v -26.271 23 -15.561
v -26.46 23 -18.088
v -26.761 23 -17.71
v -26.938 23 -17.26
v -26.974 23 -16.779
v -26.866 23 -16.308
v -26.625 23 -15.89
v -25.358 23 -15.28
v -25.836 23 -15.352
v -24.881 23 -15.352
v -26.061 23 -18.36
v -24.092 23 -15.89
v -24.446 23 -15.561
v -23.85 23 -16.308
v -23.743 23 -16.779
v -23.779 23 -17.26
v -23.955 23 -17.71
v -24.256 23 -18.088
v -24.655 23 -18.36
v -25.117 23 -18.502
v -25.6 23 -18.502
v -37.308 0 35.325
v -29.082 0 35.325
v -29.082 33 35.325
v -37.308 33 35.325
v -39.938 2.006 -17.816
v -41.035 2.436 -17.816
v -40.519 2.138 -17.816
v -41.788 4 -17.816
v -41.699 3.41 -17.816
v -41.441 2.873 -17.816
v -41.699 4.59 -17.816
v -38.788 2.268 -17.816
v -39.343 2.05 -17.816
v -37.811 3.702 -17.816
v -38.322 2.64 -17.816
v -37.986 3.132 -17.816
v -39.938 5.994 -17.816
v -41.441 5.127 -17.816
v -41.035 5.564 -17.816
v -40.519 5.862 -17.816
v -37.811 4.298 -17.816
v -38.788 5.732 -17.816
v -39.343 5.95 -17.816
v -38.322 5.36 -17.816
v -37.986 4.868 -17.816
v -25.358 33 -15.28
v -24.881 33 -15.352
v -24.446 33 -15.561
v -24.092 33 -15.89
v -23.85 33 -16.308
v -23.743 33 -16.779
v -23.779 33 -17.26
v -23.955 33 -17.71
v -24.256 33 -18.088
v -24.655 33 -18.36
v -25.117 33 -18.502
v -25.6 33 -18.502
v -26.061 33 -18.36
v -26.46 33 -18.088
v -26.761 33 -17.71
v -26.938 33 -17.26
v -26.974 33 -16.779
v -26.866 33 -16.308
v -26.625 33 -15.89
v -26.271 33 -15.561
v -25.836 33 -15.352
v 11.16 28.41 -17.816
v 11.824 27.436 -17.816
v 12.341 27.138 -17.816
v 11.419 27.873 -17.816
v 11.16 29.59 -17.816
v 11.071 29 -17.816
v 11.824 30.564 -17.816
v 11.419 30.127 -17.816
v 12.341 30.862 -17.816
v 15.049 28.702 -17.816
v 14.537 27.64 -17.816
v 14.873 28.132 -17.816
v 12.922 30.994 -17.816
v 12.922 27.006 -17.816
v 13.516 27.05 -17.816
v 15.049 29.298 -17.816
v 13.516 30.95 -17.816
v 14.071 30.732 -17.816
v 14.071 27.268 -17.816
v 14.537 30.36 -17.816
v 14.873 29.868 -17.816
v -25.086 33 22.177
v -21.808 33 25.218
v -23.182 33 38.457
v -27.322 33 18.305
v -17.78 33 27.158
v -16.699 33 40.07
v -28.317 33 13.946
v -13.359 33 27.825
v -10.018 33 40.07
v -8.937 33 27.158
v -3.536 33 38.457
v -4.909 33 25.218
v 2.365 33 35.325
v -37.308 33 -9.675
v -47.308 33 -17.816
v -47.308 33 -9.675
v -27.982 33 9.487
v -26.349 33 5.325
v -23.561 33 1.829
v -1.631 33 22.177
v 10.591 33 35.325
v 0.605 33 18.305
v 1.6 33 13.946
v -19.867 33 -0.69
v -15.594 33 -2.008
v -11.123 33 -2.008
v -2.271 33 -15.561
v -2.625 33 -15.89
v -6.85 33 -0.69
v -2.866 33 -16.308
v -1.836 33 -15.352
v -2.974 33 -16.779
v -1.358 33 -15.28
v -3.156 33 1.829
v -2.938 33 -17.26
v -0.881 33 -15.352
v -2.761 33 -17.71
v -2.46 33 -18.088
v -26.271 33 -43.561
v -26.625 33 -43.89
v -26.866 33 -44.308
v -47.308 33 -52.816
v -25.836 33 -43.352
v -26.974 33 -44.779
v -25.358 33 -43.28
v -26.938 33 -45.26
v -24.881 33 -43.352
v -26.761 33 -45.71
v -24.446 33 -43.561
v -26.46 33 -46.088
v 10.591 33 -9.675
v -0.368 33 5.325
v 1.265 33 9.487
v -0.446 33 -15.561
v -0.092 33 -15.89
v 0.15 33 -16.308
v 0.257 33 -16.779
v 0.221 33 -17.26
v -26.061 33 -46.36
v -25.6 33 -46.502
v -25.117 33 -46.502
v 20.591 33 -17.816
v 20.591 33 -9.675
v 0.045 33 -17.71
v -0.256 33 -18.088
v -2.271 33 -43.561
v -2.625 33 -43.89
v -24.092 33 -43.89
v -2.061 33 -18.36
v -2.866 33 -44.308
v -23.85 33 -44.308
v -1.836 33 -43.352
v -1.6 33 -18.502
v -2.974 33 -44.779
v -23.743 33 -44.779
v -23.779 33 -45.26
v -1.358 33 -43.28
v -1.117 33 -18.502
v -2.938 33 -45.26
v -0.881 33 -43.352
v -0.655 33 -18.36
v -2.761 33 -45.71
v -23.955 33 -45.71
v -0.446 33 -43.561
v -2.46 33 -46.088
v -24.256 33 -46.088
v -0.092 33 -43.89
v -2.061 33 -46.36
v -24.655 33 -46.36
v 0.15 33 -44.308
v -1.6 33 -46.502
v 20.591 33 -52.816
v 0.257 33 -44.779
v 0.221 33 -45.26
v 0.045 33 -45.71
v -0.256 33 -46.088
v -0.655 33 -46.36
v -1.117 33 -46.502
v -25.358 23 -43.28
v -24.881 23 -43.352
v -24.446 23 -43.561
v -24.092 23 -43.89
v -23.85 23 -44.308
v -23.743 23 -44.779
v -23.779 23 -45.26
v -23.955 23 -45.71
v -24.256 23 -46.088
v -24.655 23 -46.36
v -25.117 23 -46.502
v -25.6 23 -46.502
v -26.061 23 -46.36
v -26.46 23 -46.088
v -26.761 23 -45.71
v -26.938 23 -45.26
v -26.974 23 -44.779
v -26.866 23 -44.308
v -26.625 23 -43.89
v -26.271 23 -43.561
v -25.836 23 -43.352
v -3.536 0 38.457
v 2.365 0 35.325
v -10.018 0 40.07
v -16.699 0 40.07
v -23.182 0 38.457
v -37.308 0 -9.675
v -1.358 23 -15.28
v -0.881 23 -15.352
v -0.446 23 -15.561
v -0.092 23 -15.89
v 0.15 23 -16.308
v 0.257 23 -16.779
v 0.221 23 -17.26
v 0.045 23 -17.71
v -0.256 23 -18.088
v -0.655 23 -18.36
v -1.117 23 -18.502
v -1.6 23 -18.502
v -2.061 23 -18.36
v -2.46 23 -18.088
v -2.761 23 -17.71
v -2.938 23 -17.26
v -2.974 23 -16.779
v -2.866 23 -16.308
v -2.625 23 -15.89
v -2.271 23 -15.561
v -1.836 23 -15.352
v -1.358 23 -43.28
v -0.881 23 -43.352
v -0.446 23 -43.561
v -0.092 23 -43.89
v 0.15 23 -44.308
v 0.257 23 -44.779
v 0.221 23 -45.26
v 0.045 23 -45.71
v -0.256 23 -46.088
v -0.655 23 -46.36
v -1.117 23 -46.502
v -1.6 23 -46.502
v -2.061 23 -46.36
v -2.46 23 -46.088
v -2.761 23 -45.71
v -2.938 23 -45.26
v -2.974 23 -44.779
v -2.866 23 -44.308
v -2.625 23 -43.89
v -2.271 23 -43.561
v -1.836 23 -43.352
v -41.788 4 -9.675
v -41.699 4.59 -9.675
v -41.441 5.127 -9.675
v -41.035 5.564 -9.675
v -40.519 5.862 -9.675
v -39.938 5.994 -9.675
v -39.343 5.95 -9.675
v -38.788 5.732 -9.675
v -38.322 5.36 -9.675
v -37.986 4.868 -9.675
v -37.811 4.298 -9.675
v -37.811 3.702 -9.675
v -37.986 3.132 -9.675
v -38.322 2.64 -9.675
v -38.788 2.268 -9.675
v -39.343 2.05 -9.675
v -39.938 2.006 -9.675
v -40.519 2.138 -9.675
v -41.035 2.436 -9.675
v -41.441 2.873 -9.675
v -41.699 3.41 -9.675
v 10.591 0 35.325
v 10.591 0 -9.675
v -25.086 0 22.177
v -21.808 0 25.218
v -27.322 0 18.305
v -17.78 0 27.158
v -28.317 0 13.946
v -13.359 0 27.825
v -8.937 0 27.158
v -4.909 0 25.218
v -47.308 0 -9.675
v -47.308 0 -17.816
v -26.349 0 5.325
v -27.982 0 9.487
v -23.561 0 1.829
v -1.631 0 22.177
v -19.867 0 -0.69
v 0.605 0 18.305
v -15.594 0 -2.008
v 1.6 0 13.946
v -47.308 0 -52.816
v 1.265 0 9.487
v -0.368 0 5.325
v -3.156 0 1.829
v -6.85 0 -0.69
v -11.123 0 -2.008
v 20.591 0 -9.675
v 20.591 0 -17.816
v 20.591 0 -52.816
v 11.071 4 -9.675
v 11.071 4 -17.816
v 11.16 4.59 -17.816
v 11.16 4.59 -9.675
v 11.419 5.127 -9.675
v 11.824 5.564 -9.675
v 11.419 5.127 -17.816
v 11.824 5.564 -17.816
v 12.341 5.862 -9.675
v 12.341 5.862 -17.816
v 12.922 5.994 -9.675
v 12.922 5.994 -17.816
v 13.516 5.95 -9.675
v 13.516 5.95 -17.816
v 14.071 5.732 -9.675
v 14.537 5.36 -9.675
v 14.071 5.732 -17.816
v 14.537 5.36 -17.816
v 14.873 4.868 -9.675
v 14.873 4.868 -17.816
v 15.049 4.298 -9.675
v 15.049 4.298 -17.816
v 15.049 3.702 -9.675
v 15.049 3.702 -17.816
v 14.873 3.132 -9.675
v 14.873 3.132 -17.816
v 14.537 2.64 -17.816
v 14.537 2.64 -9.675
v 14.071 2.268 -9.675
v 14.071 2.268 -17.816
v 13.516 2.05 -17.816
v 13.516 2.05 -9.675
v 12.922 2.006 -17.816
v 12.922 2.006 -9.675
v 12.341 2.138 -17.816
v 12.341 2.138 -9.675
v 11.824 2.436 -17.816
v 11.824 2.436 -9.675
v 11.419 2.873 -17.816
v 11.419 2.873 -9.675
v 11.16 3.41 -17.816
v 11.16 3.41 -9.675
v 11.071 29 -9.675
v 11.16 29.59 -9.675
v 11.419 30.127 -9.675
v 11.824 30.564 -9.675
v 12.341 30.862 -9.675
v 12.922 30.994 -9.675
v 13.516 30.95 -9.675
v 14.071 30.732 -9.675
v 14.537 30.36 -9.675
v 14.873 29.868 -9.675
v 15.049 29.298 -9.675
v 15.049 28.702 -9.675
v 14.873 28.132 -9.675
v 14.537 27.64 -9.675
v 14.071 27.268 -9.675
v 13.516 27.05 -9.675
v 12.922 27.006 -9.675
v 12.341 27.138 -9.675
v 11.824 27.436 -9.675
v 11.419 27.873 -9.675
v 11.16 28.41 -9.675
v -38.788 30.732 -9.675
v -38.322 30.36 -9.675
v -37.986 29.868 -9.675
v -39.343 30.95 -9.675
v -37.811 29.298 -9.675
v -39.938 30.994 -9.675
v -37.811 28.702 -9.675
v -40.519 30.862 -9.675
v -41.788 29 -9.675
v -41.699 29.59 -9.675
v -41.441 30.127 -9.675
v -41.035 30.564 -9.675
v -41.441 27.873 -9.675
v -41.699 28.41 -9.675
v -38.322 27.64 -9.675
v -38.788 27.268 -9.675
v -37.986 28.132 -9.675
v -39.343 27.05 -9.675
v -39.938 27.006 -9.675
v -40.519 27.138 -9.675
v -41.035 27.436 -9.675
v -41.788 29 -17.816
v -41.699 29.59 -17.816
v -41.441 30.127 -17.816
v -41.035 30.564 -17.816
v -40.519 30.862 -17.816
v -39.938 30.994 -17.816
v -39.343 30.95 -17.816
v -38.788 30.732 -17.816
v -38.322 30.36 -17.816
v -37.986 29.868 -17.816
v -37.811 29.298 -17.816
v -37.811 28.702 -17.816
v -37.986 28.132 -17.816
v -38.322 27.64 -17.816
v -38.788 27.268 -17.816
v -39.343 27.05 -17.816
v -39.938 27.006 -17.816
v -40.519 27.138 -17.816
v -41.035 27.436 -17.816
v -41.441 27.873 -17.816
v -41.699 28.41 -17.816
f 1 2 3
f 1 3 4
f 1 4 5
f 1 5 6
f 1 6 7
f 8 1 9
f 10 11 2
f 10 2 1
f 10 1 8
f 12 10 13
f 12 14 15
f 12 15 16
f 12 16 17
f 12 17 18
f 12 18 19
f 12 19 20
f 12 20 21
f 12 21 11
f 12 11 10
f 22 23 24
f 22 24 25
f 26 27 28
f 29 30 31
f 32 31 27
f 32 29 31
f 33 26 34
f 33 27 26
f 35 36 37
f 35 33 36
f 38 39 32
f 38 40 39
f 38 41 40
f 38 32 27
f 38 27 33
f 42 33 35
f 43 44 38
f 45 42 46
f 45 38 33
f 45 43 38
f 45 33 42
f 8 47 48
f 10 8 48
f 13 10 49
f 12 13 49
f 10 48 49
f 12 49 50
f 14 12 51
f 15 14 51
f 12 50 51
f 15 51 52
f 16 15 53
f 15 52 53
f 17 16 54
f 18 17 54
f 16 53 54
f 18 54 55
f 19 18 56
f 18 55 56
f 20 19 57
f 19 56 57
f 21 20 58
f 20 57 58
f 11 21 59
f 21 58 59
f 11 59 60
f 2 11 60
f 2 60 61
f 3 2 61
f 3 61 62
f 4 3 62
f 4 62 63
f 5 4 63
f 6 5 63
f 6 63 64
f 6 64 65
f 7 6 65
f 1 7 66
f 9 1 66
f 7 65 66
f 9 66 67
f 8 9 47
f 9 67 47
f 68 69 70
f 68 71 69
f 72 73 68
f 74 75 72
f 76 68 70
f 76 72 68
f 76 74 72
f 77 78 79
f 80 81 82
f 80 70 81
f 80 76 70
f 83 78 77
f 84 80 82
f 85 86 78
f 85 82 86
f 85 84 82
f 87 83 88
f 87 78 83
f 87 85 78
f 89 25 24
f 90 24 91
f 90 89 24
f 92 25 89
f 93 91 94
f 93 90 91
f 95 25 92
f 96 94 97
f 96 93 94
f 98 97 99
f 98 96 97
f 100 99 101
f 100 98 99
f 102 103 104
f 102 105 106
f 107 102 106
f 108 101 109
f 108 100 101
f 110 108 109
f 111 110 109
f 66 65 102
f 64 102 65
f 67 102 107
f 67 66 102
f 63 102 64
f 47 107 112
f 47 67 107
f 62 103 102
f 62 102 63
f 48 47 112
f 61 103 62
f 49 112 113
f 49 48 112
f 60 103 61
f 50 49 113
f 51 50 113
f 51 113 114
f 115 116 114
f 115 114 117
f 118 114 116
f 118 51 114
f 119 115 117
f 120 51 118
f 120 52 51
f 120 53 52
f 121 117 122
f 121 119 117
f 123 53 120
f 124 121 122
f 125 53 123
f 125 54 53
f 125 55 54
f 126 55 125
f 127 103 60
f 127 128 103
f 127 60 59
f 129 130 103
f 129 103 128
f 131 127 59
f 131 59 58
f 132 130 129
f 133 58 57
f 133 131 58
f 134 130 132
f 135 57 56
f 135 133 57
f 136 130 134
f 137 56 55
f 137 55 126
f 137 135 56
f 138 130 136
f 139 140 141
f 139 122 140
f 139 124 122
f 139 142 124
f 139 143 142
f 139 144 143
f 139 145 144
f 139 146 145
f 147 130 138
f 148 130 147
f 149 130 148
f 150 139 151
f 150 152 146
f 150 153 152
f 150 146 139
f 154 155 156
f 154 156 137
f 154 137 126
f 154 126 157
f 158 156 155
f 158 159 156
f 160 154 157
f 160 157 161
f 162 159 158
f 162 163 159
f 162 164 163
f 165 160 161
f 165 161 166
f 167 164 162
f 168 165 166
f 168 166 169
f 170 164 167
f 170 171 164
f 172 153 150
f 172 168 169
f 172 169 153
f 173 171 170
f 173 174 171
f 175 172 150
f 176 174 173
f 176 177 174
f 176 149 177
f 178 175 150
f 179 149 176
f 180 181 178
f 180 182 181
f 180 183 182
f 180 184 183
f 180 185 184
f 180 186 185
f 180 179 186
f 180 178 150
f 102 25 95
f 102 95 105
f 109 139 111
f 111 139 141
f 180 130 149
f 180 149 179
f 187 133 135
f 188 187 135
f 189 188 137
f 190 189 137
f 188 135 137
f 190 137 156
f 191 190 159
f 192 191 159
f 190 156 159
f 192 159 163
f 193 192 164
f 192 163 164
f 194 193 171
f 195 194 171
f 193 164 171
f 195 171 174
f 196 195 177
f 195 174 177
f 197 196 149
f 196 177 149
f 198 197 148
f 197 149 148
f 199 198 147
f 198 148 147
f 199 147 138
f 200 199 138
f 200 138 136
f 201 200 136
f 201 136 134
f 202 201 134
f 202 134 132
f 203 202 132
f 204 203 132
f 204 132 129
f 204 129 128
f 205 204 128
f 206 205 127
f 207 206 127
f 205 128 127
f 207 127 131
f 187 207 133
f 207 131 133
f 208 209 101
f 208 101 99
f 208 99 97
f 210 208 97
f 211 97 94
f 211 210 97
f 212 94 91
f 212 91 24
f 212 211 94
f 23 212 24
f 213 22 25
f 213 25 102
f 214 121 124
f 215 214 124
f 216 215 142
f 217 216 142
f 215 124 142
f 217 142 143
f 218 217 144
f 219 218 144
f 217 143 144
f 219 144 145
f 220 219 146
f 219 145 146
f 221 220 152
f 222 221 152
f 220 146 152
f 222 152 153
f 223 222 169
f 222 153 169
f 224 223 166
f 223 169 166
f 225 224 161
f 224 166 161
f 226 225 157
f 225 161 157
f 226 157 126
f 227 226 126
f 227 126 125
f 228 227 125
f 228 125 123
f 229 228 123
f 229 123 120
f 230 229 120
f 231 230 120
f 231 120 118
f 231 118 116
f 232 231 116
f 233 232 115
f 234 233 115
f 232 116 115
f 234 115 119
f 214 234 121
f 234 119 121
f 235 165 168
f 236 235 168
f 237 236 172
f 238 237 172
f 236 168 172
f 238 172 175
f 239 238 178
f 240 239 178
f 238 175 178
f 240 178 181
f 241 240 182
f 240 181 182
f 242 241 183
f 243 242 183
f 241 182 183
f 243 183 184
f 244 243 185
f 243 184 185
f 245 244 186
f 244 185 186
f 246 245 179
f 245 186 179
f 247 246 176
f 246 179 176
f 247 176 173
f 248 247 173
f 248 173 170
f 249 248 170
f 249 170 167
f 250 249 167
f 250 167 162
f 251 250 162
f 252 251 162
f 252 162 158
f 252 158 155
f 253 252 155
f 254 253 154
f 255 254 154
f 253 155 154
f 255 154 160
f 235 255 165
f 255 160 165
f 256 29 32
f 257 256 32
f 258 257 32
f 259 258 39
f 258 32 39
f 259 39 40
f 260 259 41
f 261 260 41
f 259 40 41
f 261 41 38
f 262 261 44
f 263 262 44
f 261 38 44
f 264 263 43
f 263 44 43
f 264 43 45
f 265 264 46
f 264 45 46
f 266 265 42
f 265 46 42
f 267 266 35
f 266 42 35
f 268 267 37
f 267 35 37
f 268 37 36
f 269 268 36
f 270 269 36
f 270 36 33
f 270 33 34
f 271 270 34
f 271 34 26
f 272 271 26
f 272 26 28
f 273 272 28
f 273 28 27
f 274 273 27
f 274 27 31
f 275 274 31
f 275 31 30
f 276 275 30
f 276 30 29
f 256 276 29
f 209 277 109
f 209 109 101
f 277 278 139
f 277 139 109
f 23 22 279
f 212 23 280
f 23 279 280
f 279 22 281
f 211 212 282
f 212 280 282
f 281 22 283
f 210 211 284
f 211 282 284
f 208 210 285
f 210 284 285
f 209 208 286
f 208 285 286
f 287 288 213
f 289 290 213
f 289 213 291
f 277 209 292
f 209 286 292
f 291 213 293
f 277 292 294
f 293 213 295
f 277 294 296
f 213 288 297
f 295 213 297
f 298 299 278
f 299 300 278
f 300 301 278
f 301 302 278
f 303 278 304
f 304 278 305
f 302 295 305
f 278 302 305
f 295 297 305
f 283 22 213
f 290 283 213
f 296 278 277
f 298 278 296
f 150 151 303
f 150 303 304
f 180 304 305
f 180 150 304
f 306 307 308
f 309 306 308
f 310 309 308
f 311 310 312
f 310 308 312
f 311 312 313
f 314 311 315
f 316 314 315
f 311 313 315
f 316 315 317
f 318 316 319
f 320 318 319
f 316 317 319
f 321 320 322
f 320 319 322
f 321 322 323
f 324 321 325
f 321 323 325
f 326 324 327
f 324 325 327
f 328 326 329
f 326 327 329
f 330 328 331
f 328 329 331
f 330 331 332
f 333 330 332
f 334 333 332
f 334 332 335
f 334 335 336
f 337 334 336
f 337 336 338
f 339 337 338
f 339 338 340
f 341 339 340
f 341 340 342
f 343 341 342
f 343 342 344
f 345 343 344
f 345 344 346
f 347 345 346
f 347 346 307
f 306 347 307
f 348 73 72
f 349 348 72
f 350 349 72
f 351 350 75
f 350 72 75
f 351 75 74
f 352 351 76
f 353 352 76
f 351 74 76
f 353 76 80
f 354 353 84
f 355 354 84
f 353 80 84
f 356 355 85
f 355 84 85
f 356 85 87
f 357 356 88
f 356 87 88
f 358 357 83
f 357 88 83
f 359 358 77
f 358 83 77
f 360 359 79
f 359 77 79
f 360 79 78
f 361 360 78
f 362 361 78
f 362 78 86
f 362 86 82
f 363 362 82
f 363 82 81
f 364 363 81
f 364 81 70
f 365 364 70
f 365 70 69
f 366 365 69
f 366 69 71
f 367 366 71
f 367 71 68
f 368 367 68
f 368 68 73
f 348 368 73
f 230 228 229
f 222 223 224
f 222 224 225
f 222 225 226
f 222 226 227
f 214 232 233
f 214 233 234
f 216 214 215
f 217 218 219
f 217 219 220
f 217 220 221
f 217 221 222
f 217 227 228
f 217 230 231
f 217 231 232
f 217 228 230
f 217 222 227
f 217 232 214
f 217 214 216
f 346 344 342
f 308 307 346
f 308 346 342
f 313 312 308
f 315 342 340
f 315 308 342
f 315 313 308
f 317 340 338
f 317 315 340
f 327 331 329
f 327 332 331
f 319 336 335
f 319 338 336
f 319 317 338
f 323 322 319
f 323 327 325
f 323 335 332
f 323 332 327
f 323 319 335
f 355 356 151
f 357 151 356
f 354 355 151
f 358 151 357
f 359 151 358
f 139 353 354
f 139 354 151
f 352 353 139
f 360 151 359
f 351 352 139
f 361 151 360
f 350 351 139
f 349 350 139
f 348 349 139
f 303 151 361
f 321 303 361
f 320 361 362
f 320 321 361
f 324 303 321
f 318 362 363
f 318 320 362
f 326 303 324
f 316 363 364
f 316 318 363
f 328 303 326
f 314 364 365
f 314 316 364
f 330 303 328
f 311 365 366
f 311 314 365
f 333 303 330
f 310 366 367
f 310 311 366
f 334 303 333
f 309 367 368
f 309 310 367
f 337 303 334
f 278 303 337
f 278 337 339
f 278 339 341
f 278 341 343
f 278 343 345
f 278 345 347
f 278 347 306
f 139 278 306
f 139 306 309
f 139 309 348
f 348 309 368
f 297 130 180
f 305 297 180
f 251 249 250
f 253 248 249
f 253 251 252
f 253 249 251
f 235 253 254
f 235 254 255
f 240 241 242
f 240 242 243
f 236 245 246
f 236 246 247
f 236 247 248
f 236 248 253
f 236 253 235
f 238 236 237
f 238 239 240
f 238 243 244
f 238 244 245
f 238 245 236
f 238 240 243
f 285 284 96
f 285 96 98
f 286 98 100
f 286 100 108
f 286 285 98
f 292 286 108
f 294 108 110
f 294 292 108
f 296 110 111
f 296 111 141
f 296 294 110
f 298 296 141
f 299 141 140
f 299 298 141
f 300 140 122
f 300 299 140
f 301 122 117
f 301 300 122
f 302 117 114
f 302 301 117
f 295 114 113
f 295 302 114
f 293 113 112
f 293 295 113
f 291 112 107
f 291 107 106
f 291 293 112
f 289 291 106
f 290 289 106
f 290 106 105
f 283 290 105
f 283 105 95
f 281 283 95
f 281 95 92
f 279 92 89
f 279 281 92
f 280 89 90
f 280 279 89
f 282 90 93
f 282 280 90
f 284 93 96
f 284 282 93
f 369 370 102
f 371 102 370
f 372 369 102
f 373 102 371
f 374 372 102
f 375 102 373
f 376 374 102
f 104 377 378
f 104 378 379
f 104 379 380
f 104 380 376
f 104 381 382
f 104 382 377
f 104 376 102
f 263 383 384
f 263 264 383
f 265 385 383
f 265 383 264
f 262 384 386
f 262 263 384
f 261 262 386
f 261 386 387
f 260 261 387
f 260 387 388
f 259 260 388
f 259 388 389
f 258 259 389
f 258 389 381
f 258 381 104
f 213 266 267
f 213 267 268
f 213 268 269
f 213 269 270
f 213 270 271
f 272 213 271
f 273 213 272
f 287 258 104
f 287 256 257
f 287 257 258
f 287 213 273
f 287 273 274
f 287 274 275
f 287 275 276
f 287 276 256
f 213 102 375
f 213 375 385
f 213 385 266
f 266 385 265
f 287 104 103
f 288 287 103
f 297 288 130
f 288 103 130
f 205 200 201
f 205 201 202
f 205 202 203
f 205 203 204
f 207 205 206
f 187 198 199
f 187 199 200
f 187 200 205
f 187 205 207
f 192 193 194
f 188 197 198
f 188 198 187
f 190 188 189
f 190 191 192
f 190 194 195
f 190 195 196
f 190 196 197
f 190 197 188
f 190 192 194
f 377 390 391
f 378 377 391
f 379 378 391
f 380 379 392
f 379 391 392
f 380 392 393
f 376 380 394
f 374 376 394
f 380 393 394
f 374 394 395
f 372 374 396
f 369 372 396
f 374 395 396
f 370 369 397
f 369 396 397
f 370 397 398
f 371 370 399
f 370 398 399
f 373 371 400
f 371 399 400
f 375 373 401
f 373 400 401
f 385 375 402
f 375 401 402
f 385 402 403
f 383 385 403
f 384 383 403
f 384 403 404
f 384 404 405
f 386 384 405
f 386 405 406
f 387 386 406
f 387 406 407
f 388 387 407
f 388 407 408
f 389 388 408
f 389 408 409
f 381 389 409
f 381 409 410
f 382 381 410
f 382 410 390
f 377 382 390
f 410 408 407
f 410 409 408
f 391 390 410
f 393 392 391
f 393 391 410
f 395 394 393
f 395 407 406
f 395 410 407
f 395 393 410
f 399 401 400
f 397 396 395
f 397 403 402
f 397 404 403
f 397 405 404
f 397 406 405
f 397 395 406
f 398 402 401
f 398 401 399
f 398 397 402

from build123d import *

# Parameters (mm, degrees)
SKETCH1_R           = 15
BOSS_EXTRUDE3_DEPTH = 33
SKETCH12_R          = 2
CUT_EXTRUDE1_DEPTH  = 10
SKETCH13_W          = 67.899494937
SKETCH13_H          = 35
BOSS_EXTRUDE4_DEPTH = 33
SKETCH14_R          = 1.62
CUT_EXTRUDE2_DEPTH  = 10


with BuildPart() as part:
    # Sketch1 → Boss-Extrude3 (new body)
    with BuildSketch(Plane(origin=(0, 0, 0), x_dir=(1, 0, 0), z_dir=(0, 1, 0))):
        with BuildLine():
            Line((-47.308295415, 17.815966111), (20.591199522, 17.815966111))
            Line((20.591199522, 17.815966111), (20.591199522, 9.675262593))
            Line((20.591199522, 9.675262593), (10.591199522, 9.675262593))
            Line((10.591199522, 9.675262593), (10.591199522, -35.324737407))
            Line((10.591199522, -35.324737407), (2.365275891, -35.324737407))
            ThreePointArc((2.365275891, -35.324737407), (-13.358547947, -40.274484875), (-29.082371784, -35.324737407))
            Line((-29.082371784, -35.324737407), (-37.308295415, -35.324737407))
            Line((-37.308295415, -35.324737407), (-37.308295415, 9.675262593))
            Line((-37.308295415, 9.675262593), (-47.308295415, 9.675262593))
            Line((-47.308295415, 9.675262593), (-47.308295415, 17.815966111))
        make_face()
        with Locations(Location((-13.358547947, -12.824737407, 0), (0, 0, 270))):
            Circle(SKETCH1_R, mode=Mode.SUBTRACT)
    extrude(amount=BOSS_EXTRUDE3_DEPTH)

    # Sketch12 → Cut-Extrude1 (cut)
    with BuildSketch(Plane(origin=(0, 0, -17.815966111), x_dir=(-1, 0, 0), z_dir=(0, 0, -1))):
        with Locations((39.788295415, 4)):
            Circle(SKETCH12_R)
        with Locations((39.788295415, 29)):
            Circle(SKETCH12_R)
        with Locations((-13.071199522, 29)):
            Circle(SKETCH12_R)
        with Locations((-13.071199522, 4)):
            Circle(SKETCH12_R)
    extrude(amount=-CUT_EXTRUDE1_DEPTH, mode=Mode.SUBTRACT)

    # Sketch13 → Boss-Extrude4 (add)
    with BuildSketch(Plane(origin=(0, 33, 0), x_dir=(1, 0, 0), z_dir=(0, 1, 0))):
        with Locations((-13.358547947, 35.315966111)):
            Rectangle(SKETCH13_W, SKETCH13_H)
    extrude(amount=-BOSS_EXTRUDE4_DEPTH)

    # Sketch14 → Cut-Extrude2 (cut)
    with BuildSketch(Plane(origin=(0, 33, 0), x_dir=(1, 0, 0), z_dir=(0, 1, 0))):
        with Locations(Location((-25.358295415, 16.899970921, 0), (0, 0, 270))):
            Circle(SKETCH14_R)
        with Locations(Location((-1.358295415, 16.899970921, 0), (0, 0, 270))):
            Circle(SKETCH14_R)
        with Locations(Location((-25.358295415, 44.899970921, 0), (0, 0, 270))):
            Circle(SKETCH14_R)
        with Locations(Location((-1.358295415, 44.899970921, 0), (0, 0, 270))):
            Circle(SKETCH14_R)
    extrude(amount=-CUT_EXTRUDE2_DEPTH, mode=Mode.SUBTRACT)


solid = part.part
